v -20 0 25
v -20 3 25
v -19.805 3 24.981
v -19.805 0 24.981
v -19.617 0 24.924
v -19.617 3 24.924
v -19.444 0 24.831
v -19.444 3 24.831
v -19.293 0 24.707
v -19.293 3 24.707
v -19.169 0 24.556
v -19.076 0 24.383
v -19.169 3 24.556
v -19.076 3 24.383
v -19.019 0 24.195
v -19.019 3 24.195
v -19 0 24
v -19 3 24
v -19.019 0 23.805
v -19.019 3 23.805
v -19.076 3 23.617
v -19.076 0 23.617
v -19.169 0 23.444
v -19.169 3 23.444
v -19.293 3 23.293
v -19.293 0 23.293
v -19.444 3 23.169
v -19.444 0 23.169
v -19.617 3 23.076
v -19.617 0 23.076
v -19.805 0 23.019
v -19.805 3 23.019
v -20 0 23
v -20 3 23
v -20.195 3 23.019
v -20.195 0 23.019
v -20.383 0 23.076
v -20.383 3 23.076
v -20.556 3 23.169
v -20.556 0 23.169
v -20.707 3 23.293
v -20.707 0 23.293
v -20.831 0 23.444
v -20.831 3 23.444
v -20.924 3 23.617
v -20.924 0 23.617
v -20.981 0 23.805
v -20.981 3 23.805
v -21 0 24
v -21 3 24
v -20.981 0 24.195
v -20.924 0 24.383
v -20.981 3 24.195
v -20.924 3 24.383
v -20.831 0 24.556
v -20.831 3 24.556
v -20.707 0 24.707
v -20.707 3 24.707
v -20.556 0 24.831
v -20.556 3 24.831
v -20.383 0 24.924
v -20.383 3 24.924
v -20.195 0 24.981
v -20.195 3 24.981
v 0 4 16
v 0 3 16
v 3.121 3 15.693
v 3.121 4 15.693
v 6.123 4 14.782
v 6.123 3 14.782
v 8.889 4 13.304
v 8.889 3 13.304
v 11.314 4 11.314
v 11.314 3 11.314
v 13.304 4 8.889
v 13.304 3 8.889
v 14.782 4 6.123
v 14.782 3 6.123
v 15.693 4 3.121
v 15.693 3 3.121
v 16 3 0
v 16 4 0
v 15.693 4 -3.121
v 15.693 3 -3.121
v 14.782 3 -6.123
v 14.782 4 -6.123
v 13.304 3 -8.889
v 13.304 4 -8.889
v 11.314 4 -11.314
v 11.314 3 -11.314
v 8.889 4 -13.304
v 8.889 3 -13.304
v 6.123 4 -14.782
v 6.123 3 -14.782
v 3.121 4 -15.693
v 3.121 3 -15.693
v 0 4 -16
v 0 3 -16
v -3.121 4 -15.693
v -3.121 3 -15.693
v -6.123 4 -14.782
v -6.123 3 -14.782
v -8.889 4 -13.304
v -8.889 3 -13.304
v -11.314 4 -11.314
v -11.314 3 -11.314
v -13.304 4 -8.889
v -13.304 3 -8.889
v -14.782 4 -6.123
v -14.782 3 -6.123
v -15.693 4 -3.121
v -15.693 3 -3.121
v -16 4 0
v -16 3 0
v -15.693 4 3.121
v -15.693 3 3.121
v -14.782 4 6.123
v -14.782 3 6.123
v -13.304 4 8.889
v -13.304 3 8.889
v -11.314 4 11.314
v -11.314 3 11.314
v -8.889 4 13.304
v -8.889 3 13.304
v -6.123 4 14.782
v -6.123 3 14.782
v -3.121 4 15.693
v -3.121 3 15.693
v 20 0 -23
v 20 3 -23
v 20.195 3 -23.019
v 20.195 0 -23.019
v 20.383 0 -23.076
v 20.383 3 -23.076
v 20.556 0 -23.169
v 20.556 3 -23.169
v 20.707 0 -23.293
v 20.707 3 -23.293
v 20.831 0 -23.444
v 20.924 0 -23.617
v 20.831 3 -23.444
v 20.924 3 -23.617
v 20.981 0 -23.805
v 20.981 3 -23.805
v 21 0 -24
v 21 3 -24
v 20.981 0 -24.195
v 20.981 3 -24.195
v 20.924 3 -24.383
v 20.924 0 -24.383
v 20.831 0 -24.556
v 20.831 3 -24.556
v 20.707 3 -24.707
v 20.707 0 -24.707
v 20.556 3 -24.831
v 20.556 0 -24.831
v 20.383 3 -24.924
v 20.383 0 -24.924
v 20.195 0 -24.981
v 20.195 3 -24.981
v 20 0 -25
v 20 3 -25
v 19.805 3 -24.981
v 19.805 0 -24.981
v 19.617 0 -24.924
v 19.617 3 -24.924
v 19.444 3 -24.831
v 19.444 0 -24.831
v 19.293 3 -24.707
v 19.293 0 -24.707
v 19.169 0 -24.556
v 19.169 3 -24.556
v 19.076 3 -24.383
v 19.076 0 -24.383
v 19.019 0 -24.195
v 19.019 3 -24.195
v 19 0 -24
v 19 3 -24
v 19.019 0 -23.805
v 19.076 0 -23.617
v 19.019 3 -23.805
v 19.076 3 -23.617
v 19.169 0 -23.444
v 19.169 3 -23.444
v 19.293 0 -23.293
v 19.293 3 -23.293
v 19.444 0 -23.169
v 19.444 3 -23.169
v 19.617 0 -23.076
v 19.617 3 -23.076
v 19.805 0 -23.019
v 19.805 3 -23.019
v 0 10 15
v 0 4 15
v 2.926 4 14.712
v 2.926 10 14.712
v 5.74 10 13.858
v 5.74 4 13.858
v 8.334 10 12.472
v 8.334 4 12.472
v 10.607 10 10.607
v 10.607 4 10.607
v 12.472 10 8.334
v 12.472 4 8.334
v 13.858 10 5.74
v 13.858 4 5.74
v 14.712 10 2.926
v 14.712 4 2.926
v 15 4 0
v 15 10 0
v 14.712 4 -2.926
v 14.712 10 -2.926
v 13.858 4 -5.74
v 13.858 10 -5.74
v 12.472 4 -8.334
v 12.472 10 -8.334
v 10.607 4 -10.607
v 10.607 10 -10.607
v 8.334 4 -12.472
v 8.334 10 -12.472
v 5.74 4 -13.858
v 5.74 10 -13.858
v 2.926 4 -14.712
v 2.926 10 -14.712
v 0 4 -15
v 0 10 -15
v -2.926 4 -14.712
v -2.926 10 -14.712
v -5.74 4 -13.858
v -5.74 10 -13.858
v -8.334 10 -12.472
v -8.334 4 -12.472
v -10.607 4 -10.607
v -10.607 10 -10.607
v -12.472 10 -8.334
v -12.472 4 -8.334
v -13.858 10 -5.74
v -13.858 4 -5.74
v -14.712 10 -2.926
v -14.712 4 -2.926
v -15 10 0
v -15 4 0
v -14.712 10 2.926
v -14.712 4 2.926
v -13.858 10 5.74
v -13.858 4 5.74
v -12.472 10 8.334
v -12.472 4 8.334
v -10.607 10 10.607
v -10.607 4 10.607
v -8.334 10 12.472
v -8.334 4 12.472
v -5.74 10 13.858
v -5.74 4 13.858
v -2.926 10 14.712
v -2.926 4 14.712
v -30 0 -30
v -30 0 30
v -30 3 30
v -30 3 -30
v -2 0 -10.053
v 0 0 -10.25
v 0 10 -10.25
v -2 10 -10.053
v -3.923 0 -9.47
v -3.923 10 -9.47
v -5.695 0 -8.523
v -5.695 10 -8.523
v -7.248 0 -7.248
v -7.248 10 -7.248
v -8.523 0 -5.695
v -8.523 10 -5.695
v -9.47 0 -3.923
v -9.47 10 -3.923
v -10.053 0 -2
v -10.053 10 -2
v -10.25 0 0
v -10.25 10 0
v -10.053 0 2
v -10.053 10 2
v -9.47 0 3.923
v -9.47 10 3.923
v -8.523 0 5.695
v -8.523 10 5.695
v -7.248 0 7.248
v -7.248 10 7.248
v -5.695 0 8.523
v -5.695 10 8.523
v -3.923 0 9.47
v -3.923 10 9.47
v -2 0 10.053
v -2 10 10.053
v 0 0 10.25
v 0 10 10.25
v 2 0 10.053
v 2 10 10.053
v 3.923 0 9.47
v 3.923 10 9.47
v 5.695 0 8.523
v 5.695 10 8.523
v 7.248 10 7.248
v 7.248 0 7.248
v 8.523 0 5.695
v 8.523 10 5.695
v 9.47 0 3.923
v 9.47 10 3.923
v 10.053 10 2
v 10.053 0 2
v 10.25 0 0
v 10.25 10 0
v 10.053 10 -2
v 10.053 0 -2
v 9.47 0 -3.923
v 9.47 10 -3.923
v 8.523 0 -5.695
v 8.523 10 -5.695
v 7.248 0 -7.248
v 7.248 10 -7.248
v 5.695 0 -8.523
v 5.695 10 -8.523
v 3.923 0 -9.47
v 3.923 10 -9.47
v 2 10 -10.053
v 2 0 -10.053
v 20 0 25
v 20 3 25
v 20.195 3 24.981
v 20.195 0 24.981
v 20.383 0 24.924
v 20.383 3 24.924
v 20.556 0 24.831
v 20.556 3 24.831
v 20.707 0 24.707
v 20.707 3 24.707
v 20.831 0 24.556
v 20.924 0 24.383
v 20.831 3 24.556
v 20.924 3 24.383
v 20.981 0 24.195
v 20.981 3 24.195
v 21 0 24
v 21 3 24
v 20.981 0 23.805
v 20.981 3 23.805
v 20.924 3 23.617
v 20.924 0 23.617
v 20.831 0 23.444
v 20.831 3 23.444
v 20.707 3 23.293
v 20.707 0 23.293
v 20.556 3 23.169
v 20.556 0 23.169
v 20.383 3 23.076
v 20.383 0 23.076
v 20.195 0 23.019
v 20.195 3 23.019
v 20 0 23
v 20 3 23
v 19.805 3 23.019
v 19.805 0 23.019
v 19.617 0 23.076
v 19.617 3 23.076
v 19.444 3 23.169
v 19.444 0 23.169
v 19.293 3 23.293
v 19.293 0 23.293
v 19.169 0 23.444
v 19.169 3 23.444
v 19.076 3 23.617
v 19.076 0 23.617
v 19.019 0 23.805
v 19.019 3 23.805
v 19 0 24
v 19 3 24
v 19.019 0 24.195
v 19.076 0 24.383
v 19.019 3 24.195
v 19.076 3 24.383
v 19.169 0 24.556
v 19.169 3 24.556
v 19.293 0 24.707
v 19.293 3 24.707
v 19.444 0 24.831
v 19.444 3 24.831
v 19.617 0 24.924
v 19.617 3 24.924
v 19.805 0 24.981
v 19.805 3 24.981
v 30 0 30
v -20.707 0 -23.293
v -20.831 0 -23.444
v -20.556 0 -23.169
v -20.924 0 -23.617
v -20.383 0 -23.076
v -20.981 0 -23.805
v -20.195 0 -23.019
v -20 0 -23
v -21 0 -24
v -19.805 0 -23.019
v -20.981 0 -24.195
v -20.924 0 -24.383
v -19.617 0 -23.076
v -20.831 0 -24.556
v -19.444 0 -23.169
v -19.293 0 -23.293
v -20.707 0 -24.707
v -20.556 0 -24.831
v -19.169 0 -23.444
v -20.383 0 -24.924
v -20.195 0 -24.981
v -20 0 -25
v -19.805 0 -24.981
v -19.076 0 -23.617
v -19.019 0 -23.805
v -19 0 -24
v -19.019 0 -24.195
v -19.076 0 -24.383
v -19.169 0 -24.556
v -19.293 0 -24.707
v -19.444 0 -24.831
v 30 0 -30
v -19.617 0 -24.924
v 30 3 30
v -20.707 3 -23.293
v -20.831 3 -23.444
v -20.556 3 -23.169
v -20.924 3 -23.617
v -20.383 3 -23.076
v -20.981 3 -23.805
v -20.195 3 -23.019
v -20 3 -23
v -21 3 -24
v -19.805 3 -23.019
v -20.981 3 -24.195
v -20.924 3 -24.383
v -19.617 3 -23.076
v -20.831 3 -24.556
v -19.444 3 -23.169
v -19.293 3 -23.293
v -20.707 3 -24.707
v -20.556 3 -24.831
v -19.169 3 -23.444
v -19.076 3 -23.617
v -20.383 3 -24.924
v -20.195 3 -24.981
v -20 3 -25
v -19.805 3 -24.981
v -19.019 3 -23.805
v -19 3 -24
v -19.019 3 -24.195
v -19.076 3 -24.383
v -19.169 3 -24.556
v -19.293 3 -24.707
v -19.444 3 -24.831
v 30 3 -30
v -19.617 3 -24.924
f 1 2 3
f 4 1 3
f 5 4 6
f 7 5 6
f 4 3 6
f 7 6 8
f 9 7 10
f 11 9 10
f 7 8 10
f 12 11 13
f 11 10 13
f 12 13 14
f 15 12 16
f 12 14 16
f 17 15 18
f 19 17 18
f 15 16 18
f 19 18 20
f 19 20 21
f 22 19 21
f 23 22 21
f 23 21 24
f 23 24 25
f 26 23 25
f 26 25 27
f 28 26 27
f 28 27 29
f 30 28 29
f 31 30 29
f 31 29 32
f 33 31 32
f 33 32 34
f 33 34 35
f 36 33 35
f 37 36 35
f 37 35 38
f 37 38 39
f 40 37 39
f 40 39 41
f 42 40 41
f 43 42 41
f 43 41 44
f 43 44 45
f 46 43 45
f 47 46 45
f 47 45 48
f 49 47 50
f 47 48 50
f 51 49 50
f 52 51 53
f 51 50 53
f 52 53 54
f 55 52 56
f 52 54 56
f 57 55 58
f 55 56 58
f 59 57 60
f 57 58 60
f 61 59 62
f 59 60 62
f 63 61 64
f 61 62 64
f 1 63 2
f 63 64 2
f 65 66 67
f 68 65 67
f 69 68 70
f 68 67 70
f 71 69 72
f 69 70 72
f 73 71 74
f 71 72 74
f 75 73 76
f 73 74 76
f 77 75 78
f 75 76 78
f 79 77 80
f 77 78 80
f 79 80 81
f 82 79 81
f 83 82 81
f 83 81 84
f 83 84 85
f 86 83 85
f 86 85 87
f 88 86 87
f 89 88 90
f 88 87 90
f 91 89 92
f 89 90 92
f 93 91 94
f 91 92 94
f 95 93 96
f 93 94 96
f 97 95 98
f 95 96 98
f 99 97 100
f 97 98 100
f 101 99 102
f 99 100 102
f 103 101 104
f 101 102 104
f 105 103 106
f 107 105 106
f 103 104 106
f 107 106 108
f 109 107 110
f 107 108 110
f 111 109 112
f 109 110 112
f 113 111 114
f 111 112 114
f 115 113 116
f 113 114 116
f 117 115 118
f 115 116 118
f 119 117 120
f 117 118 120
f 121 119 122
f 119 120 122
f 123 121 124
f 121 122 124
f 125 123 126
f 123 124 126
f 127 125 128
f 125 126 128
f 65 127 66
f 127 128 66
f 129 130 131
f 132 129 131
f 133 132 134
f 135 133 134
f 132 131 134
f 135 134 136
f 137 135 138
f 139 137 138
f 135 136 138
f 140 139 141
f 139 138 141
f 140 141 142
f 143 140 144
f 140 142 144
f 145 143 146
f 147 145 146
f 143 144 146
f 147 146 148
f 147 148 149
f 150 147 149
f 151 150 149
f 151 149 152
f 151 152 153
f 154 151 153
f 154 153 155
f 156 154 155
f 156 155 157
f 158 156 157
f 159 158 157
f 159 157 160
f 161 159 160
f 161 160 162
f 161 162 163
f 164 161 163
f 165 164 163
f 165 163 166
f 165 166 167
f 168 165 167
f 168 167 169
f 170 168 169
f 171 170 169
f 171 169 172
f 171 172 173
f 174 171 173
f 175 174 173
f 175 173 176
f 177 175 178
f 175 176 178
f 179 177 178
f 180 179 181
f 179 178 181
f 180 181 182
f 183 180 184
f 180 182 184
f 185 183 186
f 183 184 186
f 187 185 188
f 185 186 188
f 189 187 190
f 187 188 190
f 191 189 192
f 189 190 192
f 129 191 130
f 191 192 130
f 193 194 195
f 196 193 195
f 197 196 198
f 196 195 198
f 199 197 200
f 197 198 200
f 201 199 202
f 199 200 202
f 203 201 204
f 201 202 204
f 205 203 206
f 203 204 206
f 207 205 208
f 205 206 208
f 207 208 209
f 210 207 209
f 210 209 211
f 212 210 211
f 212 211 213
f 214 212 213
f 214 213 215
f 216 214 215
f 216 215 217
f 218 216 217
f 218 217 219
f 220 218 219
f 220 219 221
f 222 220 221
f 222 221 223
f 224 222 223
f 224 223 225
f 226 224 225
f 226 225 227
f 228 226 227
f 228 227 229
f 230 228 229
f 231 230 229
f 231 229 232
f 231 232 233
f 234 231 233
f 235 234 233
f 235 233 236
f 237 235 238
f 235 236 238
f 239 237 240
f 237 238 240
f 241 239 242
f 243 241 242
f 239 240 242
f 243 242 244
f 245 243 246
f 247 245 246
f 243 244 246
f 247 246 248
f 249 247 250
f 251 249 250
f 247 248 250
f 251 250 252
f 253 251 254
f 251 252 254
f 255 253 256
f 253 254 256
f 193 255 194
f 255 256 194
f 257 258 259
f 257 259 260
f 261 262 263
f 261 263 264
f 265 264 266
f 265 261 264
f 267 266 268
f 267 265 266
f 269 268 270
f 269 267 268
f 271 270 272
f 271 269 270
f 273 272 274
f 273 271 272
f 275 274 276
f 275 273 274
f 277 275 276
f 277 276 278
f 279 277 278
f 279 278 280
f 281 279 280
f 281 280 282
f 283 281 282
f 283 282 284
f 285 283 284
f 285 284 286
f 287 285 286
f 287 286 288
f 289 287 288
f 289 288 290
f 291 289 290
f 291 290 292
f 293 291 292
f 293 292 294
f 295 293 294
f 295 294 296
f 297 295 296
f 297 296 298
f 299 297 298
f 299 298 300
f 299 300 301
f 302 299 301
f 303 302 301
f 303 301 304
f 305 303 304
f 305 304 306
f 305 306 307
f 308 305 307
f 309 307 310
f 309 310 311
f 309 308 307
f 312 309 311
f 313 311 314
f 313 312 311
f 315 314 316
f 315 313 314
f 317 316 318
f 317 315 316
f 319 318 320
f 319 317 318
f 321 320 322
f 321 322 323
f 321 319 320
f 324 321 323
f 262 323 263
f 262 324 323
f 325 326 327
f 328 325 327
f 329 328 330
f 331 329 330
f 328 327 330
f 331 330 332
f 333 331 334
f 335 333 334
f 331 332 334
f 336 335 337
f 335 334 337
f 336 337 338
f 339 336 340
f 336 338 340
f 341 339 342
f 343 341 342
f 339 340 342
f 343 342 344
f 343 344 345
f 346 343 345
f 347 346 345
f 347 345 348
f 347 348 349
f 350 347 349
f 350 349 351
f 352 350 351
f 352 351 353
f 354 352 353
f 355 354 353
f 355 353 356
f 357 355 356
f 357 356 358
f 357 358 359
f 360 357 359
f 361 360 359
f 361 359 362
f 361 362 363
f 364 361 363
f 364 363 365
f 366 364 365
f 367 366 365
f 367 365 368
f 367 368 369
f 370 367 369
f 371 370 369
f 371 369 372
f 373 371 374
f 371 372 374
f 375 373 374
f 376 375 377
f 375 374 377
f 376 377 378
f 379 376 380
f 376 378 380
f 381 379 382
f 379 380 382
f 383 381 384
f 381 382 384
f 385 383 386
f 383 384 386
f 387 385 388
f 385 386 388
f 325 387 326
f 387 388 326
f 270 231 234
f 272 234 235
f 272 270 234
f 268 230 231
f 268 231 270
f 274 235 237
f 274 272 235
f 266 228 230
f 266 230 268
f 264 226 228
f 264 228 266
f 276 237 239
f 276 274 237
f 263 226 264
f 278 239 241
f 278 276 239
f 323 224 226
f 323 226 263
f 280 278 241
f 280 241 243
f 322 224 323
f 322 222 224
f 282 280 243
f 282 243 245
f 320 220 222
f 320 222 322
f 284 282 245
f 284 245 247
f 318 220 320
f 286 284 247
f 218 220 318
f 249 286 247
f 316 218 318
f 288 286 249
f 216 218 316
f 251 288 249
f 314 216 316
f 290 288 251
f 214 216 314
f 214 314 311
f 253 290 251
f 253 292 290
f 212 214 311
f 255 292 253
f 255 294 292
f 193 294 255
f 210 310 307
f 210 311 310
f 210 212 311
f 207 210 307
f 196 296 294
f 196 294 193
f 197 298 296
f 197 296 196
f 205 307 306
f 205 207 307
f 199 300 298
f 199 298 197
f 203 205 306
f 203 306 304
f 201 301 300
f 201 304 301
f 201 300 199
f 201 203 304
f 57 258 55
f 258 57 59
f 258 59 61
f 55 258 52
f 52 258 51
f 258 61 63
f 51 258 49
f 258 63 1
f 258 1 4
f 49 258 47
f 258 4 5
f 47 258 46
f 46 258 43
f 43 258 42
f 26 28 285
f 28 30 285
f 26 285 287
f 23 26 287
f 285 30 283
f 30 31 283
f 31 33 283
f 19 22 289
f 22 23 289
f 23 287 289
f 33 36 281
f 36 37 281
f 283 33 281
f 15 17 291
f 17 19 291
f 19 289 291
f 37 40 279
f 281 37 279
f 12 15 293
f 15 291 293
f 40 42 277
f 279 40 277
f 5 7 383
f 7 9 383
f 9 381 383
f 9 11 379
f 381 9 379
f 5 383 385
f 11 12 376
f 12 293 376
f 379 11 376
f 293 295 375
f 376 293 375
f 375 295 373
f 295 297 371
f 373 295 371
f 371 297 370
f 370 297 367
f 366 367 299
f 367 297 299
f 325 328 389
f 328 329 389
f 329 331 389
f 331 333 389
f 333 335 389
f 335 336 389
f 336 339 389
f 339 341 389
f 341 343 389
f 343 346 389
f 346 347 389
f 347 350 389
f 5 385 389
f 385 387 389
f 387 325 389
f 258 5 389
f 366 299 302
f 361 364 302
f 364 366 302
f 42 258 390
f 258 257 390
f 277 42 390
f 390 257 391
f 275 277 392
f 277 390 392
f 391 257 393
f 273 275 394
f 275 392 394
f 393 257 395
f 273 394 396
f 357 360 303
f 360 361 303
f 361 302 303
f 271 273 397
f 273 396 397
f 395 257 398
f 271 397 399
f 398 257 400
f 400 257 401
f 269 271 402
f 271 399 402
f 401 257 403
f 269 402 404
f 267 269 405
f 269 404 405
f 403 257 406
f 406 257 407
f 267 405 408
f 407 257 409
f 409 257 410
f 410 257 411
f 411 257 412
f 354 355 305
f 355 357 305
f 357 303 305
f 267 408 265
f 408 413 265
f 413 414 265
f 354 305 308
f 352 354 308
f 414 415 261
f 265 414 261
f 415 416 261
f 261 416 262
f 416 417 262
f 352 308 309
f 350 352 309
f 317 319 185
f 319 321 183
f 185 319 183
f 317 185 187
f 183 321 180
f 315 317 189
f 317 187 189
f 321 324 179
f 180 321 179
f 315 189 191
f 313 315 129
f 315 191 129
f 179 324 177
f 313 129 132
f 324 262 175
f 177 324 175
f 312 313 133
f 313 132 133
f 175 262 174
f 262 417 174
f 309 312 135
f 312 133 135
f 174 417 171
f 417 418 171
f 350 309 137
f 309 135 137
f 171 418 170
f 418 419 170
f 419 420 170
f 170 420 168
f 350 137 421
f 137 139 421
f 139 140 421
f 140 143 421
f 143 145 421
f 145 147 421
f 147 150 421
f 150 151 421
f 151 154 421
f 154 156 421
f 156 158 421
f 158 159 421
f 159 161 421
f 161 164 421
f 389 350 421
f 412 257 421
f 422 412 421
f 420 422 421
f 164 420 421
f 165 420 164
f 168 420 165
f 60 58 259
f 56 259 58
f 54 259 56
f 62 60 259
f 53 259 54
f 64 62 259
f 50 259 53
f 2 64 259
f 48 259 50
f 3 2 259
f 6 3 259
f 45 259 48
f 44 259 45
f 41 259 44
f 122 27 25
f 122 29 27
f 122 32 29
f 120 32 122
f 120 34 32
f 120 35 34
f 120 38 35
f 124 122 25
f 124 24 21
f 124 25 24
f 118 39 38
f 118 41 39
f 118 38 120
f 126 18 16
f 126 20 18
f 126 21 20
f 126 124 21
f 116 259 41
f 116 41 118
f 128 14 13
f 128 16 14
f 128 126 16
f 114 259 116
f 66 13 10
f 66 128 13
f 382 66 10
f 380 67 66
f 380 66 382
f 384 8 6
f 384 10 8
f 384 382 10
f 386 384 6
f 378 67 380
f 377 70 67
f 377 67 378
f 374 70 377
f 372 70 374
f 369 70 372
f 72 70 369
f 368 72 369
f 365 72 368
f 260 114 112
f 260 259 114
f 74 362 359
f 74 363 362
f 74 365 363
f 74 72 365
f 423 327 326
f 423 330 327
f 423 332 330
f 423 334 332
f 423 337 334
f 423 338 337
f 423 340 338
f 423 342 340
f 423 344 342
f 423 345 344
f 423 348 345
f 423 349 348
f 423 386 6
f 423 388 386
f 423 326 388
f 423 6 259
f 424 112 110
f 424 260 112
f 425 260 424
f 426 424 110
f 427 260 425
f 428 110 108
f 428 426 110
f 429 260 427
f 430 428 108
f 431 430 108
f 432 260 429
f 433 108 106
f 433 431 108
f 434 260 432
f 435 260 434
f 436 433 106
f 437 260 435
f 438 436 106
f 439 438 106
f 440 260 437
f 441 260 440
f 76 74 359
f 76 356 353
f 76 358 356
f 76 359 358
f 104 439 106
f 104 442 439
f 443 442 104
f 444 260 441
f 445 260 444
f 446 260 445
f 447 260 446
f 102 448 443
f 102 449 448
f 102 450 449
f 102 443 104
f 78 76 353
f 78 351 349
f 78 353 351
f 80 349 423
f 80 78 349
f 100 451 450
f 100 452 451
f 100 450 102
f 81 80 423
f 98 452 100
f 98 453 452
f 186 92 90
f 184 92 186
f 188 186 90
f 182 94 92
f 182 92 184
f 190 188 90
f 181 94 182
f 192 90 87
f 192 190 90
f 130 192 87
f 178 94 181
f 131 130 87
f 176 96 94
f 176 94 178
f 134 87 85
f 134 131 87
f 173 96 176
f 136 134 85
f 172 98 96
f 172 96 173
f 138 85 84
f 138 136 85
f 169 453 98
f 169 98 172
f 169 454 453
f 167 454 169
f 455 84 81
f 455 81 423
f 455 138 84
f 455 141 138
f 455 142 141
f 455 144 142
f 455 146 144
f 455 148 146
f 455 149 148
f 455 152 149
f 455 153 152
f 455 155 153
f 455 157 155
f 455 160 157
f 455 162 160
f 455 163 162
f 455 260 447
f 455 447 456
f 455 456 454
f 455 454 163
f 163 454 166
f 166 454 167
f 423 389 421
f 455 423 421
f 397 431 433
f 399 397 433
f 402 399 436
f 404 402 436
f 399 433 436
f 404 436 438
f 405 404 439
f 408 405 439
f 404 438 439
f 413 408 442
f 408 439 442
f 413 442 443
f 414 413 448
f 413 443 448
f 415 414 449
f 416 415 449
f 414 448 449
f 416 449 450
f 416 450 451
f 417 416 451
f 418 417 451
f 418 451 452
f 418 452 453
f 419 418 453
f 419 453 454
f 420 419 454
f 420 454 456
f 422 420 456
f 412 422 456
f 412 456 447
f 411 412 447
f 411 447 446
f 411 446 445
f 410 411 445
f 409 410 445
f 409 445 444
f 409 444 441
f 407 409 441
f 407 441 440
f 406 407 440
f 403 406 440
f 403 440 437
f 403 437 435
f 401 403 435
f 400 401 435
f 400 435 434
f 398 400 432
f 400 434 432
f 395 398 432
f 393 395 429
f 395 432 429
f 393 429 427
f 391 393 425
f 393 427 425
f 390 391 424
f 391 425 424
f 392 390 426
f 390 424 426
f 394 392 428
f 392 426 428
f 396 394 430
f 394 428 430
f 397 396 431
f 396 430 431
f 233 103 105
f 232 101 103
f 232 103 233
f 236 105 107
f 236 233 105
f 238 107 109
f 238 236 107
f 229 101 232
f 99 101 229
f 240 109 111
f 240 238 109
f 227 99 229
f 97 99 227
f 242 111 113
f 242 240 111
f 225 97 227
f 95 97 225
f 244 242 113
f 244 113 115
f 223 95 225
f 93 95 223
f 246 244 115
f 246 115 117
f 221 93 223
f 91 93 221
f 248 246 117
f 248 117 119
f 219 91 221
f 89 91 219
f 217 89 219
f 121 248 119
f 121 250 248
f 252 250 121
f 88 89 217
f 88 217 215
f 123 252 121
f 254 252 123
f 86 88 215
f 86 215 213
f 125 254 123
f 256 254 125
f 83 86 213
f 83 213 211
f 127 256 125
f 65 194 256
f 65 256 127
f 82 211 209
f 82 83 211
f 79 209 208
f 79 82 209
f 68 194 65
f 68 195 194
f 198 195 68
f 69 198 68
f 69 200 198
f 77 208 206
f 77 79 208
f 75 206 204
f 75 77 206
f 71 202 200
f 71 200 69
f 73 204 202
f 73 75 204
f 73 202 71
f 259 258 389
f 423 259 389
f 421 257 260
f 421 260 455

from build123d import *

# Parameters (mm, degrees)
SKETCH1_W           = 60
SKETCH1_H           = 60
BOSS_EXTRUDE1_DEPTH = 3
SKETCH3_R           = 1
CUT_EXTRUDE3_DEPTH  = 43.532340636
SKETCH5_R           = 10.25
CUT_EXTRUDE4_DEPTH  = 43.532340636
SKETCH6_R           = 16
SKETCH6_R_2         = 10.25
BOSS_EXTRUDE2_DEPTH = 1
SKETCH7_R           = 15
SKETCH7_R_2         = 10.25
BOSS_EXTRUDE3_DEPTH = 7


with BuildPart() as part:
    # Sketch1 → Boss-Extrude1 (new body)
    with BuildSketch(Plane(origin=(0, 0, 0), x_dir=(1, 0, 0), z_dir=(0, 1, 0))):
        Rectangle(SKETCH1_W, SKETCH1_H)
    extrude(amount=BOSS_EXTRUDE1_DEPTH)

    # Sketch3 → Cut-Extrude3 (cut, through all)
    with BuildSketch(Plane(origin=(0, 3, 0), x_dir=(1, 0, 0), z_dir=(0, 1, 0))):
        with Locations(Location((-20, 24, 0), (0, 0, 270))):
            Circle(SKETCH3_R)
        with Locations(Location((20, 24, 0), (0, 0, 270))):
            Circle(SKETCH3_R)
        with Locations(Location((-20, -24, 0), (0, 0, 270))):
            Circle(SKETCH3_R)
        with Locations(Location((20, -24, 0), (0, 0, 270))):
            Circle(SKETCH3_R)
    extrude(amount=-CUT_EXTRUDE3_DEPTH, mode=Mode.SUBTRACT)

    # Sketch5 → Cut-Extrude4 (cut, through all)
    with BuildSketch(Plane.XZ):
        with Locations(Location((0, 0, 0), (0, 0, 270))):
            Circle(SKETCH5_R)
    extrude(amount=-CUT_EXTRUDE4_DEPTH, mode=Mode.SUBTRACT)

    # Sketch6 → Boss-Extrude2 (add)
    with BuildSketch(Plane(origin=(0, 3, 0), x_dir=(1, 0, 0), z_dir=(0, 1, 0))):
        with Locations(Location((0, 0, 0), (0, 0, 270))):
            Circle(SKETCH6_R)
        with Locations(Location((0, 0, 0), (0, 0, 90))):
            Circle(SKETCH6_R_2, mode=Mode.SUBTRACT)
    extrude(amount=BOSS_EXTRUDE2_DEPTH)

    # Sketch7 → Boss-Extrude3 (add)
    with BuildSketch(Plane(origin=(0, 3, 0), x_dir=(1, 0, 0), z_dir=(0, 1, 0))):
        with Locations(Location((0, 0, 0), (0, 0, 270))):
            Circle(SKETCH7_R)
        with Locations(Location((0, 0, 0), (0, 0, 90))):
            Circle(SKETCH7_R_2, mode=Mode.SUBTRACT)
    extrude(amount=BOSS_EXTRUDE3_DEPTH)


solid = part.part
